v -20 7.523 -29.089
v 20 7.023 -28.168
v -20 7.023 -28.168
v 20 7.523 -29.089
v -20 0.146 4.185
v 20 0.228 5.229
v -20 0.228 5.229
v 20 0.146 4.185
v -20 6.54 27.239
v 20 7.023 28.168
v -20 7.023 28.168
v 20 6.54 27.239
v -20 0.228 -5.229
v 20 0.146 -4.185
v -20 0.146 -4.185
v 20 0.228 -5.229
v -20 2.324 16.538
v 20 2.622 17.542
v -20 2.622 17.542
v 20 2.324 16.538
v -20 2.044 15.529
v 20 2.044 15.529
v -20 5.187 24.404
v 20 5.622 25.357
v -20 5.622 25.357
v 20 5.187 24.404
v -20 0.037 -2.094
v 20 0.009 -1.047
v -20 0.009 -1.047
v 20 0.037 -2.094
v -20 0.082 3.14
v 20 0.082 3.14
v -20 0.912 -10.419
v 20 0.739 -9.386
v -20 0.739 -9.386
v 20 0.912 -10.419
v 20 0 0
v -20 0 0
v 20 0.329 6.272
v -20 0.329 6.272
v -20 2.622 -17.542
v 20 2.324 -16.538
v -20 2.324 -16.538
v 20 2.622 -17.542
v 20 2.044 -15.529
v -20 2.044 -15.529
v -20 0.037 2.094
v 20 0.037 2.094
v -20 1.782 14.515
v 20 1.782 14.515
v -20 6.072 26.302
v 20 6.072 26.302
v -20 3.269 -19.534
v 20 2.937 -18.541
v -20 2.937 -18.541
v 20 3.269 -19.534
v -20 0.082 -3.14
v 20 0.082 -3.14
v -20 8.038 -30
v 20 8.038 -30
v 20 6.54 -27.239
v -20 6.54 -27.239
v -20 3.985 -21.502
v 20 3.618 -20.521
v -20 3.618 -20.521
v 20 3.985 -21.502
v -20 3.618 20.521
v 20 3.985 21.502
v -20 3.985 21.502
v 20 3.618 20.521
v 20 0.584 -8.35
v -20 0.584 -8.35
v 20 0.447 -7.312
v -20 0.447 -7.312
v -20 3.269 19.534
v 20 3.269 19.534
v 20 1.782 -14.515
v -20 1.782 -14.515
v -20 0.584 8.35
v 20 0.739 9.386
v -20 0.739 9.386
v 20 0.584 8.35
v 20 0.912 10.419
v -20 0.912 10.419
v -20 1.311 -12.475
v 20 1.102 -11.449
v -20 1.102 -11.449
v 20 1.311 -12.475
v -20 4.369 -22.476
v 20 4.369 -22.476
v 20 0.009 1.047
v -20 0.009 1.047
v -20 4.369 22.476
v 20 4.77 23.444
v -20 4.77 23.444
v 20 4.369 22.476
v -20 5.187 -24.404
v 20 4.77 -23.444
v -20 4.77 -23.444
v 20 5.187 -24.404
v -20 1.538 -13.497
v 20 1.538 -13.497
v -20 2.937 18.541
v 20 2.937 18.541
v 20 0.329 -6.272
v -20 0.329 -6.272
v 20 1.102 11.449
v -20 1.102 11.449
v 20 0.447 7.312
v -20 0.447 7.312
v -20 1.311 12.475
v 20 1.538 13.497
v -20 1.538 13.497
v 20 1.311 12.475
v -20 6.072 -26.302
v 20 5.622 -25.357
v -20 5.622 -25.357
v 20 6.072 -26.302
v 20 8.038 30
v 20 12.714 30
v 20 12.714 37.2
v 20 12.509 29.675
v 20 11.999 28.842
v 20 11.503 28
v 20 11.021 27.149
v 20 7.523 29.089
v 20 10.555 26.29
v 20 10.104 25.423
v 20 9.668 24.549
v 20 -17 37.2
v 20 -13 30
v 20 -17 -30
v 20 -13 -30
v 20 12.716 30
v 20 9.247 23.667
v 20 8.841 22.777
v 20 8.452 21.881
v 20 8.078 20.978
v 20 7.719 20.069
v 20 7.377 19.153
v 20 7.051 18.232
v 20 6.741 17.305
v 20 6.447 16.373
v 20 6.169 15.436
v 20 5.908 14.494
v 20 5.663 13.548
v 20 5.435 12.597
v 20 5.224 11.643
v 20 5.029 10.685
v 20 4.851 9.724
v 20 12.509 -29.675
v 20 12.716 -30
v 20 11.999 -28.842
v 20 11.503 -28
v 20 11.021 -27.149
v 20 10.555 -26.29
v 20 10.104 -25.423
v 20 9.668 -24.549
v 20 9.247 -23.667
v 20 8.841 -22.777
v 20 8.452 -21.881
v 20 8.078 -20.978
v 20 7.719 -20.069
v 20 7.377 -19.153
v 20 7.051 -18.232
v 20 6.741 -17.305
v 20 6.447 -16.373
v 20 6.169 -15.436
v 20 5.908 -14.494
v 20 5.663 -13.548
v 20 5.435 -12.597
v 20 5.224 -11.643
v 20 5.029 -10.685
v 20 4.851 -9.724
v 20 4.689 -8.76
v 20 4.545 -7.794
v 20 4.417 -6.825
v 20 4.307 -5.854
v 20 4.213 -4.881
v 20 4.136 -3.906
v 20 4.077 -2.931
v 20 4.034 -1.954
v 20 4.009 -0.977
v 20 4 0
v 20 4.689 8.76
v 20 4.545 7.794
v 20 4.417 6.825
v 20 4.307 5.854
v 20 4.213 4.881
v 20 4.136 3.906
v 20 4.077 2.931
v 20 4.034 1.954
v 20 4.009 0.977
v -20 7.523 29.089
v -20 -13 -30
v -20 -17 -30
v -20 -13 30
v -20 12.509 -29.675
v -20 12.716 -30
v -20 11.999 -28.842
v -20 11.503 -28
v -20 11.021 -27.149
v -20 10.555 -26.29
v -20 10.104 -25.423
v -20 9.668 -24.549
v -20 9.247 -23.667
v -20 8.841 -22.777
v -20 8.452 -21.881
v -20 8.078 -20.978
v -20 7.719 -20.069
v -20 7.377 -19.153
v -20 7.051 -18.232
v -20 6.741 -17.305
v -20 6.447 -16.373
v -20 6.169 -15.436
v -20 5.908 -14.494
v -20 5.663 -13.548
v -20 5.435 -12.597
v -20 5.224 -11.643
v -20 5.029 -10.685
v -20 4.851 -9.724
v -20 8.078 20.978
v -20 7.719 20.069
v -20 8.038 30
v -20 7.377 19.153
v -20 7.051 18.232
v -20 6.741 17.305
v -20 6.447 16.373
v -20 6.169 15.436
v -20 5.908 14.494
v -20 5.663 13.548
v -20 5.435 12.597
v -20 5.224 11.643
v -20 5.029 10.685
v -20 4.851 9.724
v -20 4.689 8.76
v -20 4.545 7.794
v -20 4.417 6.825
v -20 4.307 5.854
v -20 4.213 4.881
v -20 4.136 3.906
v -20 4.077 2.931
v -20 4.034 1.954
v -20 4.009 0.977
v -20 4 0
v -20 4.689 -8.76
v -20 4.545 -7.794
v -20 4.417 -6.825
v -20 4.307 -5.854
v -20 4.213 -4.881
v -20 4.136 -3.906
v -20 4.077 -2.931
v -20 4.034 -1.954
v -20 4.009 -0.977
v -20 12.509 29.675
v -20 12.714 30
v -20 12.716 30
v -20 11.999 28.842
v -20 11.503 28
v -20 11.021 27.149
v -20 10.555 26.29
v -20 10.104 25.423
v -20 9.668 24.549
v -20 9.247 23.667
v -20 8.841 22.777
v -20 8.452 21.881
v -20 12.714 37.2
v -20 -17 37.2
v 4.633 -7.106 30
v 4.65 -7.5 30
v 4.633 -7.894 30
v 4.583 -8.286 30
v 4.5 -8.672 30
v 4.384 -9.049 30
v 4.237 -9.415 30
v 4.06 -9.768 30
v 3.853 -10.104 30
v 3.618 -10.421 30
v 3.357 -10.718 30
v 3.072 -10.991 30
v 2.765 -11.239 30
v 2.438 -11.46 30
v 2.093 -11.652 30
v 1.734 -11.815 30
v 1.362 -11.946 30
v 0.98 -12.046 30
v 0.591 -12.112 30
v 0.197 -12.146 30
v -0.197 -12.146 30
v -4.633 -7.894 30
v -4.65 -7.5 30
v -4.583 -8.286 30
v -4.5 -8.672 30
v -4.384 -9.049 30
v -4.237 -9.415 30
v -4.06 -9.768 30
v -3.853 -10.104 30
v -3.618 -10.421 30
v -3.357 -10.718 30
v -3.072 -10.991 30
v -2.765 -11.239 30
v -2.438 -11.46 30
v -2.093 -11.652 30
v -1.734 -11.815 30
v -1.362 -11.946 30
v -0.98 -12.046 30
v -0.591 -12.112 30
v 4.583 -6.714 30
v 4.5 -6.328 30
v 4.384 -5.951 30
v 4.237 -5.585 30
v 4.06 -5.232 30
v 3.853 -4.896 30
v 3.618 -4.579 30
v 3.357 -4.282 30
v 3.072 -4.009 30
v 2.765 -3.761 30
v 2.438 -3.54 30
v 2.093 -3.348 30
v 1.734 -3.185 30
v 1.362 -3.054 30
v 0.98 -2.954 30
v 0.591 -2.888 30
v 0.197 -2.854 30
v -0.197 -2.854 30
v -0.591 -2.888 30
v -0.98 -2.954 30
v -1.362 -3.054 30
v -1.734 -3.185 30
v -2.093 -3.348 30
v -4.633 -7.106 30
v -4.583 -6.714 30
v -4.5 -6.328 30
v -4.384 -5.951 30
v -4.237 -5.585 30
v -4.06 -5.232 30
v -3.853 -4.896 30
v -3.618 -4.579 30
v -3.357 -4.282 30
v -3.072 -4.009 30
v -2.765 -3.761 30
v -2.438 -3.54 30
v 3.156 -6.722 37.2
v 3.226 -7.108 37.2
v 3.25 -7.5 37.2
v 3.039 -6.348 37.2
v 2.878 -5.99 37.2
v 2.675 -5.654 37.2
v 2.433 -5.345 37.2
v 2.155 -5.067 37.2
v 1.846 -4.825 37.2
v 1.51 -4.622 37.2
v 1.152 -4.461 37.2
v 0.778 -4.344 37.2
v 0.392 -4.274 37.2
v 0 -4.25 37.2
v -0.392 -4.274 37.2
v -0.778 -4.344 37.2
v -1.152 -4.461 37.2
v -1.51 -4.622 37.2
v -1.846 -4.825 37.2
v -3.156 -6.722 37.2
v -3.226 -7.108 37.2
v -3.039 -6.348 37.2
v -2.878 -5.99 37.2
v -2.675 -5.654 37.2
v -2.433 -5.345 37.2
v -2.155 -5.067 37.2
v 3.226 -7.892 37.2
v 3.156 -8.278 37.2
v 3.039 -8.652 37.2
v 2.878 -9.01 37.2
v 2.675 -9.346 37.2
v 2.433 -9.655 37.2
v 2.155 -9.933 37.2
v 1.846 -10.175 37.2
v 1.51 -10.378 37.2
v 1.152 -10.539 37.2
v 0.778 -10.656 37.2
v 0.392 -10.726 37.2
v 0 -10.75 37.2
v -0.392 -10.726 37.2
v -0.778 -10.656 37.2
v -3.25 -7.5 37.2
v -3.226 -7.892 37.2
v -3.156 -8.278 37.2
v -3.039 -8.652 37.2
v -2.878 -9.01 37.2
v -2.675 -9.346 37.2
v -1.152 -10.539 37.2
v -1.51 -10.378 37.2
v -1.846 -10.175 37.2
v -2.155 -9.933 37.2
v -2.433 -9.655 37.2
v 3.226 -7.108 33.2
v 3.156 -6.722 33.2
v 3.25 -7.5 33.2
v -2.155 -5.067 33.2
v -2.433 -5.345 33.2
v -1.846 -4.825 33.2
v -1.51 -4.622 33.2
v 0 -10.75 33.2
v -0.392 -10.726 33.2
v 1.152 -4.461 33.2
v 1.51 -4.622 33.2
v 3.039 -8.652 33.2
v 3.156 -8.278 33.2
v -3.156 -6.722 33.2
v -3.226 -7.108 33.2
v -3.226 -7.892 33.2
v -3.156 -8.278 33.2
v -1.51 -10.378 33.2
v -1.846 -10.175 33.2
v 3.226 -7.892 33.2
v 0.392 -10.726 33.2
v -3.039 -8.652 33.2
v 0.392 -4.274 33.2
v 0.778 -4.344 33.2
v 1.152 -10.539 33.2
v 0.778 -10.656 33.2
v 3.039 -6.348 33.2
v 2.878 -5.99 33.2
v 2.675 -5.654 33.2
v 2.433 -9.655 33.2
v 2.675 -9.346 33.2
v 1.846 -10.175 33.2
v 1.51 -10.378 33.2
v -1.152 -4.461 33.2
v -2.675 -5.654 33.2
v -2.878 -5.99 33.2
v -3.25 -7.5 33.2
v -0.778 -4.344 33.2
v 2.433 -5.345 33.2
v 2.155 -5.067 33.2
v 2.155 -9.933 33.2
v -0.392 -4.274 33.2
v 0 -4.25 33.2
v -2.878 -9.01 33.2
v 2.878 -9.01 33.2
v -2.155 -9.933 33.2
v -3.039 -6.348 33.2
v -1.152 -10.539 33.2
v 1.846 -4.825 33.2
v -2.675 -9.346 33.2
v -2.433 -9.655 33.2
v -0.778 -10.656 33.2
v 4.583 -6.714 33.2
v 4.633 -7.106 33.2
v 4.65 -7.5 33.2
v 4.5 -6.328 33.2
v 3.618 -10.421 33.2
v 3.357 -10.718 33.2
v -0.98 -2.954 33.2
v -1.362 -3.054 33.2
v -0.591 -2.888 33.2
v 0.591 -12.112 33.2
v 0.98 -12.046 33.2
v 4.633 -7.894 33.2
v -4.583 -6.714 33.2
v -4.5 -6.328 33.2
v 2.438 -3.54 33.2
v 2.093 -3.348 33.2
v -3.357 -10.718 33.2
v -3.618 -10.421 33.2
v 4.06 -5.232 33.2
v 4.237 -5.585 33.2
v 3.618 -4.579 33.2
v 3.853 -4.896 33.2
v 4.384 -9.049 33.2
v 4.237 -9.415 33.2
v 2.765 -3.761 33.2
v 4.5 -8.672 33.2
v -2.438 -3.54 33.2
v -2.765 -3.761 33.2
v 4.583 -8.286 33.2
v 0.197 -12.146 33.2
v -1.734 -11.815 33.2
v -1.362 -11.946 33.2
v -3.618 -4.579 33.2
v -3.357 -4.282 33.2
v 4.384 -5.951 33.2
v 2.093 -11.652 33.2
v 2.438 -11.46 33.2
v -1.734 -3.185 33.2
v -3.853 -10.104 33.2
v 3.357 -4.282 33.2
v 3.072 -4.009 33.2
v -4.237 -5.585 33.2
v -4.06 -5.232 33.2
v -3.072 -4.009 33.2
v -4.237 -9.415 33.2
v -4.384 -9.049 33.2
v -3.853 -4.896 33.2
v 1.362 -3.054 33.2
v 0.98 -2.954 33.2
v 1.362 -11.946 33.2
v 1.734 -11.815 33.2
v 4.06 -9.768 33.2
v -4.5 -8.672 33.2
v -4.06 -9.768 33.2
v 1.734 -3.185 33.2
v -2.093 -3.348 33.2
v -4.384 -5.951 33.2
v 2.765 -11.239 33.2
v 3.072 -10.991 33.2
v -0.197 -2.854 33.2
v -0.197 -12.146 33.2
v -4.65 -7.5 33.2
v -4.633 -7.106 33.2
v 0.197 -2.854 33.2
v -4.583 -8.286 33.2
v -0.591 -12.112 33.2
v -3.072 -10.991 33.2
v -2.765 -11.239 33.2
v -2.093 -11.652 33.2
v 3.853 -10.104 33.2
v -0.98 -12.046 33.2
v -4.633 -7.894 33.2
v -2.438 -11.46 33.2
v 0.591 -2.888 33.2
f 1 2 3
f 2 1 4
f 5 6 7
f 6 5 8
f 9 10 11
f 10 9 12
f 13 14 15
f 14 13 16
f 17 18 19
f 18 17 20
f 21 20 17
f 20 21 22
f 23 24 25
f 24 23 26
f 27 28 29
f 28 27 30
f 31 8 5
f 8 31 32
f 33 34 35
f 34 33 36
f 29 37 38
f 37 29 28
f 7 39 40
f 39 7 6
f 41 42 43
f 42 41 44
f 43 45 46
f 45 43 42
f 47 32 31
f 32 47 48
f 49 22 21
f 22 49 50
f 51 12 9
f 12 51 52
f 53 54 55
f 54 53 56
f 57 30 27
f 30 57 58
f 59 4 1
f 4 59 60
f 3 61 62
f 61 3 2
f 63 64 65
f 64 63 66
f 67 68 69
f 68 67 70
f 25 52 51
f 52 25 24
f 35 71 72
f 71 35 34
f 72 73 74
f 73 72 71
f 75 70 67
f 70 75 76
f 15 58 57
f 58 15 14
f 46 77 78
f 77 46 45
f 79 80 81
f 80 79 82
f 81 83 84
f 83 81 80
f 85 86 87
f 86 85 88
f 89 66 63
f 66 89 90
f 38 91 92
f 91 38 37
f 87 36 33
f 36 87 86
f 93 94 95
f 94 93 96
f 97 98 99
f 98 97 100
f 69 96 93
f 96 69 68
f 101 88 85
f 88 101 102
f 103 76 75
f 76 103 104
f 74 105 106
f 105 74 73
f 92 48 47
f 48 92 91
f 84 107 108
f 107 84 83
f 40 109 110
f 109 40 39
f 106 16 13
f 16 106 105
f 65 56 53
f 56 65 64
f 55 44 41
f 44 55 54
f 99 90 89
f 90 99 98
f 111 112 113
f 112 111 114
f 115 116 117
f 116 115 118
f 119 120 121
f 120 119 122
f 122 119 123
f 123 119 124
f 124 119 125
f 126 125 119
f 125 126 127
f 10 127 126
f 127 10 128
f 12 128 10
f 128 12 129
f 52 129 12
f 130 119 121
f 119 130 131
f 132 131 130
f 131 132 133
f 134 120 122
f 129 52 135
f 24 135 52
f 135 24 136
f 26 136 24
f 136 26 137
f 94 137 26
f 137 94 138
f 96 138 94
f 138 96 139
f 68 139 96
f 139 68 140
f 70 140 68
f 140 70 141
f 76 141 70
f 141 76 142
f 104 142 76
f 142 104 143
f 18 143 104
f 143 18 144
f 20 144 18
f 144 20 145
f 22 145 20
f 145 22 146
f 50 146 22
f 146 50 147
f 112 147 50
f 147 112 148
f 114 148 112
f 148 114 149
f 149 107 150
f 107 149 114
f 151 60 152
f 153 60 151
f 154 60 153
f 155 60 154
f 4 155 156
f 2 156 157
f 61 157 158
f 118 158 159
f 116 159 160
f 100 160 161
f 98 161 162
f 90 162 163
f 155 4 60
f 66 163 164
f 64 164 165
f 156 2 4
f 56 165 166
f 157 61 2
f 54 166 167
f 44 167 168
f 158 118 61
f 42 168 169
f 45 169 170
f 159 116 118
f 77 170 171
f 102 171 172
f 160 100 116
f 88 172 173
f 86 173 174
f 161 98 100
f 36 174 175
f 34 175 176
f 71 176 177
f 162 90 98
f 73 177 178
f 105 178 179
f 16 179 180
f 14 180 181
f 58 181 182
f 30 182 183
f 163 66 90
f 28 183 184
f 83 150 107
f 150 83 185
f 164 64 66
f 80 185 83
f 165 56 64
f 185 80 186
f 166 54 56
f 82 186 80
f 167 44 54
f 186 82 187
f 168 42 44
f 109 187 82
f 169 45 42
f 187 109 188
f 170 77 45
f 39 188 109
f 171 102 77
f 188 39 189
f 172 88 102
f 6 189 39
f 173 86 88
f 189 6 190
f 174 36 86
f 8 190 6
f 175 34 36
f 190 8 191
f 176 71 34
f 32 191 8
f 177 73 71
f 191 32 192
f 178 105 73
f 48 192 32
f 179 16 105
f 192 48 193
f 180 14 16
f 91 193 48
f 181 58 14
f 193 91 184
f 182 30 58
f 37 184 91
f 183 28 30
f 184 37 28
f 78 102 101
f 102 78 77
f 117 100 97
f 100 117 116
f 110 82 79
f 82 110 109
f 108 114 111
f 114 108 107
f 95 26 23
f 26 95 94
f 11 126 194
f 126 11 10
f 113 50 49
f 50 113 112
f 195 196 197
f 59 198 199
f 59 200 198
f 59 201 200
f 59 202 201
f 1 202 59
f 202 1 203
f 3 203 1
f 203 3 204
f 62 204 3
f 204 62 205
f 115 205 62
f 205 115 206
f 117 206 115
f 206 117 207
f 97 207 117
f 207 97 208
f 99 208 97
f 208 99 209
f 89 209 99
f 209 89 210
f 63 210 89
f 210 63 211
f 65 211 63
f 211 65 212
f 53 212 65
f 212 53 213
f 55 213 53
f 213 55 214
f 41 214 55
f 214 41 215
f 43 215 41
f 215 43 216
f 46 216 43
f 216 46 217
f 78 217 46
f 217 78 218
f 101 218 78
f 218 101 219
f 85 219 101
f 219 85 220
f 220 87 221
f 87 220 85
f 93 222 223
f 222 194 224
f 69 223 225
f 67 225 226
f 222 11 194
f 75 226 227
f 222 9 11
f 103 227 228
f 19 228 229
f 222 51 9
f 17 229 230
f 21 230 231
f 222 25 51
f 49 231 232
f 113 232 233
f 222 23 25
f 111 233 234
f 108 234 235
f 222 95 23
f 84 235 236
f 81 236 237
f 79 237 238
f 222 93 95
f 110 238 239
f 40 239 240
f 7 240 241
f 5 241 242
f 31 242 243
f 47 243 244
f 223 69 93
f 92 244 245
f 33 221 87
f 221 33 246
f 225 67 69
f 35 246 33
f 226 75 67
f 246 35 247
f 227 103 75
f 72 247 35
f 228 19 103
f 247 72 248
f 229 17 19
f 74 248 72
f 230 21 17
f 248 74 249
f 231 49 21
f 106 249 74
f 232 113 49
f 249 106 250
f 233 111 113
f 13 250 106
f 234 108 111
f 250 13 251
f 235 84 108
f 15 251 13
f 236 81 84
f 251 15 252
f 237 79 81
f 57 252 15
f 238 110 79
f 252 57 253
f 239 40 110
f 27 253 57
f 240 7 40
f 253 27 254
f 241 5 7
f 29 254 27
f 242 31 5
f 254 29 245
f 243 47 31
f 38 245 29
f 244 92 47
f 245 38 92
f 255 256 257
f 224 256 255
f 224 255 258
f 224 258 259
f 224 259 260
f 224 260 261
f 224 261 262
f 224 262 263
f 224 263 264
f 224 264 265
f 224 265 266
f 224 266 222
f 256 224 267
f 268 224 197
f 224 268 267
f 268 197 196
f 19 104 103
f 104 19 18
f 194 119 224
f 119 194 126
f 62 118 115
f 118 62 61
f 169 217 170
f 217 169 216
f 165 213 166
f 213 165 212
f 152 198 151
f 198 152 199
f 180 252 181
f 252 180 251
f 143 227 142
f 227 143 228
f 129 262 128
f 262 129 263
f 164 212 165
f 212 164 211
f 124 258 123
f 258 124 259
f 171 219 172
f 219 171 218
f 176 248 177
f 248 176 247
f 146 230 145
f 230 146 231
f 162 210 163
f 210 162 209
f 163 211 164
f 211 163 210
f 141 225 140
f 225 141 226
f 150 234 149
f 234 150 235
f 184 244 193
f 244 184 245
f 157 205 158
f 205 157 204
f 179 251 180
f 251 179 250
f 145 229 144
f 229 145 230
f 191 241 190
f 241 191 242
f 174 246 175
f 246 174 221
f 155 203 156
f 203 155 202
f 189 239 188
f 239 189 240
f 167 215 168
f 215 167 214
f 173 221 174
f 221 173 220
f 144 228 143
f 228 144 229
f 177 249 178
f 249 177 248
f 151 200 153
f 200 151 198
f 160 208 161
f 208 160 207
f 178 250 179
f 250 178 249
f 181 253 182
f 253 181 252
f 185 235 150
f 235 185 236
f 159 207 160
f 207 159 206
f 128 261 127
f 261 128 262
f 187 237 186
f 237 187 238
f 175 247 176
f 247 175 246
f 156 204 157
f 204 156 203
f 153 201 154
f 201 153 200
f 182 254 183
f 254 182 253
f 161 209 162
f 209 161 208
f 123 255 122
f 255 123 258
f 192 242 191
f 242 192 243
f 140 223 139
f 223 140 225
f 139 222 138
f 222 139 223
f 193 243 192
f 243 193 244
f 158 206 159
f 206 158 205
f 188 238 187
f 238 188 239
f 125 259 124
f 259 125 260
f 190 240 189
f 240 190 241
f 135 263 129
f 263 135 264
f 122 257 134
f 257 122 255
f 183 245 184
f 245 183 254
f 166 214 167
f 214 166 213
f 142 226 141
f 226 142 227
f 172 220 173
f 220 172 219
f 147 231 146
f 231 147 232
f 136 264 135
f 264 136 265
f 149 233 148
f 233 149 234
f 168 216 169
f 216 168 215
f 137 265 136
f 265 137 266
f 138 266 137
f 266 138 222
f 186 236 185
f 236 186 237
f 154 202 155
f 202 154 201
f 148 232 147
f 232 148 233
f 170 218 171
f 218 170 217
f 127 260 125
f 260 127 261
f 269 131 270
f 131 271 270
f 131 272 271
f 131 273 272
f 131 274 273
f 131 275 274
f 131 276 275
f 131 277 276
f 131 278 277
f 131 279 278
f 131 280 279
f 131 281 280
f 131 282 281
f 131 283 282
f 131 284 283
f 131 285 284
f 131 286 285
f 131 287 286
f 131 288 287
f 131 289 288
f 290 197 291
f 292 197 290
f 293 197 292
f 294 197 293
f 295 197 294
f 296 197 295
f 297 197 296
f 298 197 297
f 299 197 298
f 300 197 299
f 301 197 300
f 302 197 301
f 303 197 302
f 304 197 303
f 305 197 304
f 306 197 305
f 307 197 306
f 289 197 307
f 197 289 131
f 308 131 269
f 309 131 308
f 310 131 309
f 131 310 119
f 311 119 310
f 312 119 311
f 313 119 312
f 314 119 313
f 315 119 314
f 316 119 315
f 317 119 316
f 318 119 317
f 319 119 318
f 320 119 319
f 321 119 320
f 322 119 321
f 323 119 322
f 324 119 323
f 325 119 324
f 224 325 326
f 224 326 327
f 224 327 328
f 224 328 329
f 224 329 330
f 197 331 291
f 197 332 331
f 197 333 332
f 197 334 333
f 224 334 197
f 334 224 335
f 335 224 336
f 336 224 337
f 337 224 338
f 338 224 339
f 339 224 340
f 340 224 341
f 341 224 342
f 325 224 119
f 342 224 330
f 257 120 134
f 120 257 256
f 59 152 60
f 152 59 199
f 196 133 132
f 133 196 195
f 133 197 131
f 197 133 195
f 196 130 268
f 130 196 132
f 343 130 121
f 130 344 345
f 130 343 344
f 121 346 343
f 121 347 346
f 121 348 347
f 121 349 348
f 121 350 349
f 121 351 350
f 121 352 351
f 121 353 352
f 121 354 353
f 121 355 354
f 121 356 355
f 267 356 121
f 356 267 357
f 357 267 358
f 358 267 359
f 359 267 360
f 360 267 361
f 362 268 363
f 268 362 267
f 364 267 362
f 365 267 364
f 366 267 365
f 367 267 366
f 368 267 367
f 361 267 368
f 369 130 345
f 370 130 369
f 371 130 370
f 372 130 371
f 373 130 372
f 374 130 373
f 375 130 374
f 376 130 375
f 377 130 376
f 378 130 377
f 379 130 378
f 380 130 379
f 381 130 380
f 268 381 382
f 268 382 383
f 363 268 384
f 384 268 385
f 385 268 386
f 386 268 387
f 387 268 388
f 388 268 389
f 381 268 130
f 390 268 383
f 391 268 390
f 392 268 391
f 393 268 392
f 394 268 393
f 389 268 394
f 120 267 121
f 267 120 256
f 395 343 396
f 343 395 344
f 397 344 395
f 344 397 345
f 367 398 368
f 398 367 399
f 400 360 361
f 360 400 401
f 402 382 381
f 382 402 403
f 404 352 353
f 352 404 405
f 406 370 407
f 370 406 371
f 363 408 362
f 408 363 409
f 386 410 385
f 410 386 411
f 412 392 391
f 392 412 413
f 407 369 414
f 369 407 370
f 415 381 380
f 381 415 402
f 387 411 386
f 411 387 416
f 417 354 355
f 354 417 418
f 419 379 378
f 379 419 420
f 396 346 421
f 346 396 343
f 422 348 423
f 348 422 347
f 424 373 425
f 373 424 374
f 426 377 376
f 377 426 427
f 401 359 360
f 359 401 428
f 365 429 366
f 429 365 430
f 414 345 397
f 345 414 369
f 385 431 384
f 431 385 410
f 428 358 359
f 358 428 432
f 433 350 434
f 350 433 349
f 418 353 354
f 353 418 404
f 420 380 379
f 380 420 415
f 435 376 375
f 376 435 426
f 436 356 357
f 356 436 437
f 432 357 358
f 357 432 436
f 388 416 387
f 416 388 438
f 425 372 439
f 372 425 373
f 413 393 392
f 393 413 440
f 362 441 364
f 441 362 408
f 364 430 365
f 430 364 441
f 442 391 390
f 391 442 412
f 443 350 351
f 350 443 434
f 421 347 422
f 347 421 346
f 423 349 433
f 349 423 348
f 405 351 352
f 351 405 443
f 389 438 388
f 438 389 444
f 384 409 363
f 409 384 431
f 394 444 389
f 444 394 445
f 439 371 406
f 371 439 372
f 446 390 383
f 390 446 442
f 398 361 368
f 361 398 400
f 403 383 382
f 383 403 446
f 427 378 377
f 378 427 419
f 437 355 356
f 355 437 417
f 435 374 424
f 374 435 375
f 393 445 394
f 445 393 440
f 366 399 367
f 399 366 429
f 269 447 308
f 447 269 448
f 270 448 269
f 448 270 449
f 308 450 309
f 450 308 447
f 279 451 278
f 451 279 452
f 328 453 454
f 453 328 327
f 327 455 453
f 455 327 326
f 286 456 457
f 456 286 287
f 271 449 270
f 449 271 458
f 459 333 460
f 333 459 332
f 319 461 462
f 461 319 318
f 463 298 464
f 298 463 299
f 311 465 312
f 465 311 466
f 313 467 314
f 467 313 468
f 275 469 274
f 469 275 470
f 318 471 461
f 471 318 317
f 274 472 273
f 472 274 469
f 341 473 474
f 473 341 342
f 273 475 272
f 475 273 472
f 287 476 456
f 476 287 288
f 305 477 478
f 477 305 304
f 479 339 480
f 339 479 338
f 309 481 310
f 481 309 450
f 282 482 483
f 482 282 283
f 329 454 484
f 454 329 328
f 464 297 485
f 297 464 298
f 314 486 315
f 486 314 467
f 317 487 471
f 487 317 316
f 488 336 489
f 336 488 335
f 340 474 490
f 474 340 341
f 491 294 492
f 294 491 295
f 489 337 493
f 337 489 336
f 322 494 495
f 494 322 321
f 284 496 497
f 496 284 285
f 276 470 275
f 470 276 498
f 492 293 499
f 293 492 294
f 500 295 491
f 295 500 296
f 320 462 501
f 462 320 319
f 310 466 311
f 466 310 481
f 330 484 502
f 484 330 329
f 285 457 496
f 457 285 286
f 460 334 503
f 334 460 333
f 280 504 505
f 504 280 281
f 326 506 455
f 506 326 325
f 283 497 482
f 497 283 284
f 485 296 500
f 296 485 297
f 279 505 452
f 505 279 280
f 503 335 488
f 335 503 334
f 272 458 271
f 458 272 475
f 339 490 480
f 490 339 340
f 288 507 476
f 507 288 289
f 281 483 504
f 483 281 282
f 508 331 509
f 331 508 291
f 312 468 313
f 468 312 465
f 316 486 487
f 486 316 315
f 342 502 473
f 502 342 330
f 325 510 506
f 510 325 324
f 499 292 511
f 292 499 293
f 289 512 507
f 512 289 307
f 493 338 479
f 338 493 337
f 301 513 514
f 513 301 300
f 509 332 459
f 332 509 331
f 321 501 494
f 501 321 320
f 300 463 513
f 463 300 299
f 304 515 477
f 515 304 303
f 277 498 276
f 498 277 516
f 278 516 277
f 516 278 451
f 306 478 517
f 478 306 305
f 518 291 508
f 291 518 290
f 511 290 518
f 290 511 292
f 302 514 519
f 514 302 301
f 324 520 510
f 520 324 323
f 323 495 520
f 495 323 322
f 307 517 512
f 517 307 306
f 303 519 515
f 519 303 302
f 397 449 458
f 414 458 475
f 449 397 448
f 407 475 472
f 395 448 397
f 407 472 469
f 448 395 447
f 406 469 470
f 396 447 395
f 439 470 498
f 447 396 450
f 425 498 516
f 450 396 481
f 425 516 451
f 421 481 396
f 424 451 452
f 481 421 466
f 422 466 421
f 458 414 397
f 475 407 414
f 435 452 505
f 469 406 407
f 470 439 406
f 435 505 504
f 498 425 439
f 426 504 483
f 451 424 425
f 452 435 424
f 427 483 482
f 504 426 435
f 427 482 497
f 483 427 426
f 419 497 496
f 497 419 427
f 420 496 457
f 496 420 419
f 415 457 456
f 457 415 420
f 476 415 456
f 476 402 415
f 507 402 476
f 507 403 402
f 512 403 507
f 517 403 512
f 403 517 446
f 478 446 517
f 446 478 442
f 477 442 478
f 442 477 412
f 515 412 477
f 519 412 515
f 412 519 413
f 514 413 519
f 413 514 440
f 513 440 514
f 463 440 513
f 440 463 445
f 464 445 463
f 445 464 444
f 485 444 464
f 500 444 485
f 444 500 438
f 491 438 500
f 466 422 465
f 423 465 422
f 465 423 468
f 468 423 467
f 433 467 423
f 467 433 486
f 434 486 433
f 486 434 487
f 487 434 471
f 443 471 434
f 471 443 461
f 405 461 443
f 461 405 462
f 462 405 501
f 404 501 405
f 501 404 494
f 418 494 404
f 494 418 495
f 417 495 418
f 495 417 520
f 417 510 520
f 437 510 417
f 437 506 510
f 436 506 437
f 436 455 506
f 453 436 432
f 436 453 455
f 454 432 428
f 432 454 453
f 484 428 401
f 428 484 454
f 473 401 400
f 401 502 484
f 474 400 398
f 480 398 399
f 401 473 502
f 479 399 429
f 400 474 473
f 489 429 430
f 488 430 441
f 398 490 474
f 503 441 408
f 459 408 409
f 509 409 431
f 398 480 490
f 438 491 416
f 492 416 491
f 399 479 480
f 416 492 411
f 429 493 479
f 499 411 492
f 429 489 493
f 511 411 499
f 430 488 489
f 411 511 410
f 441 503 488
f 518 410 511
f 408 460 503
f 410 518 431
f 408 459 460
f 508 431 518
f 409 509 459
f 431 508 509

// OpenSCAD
$fa = 1;
$fs = 0.4;

fastening_width = 40.00;
fastening_height = 60.00;
bed_thickness = 15.00;
fastening_thickness = 4.00;
/* Arch for the fastening */
reflex_r = fastening_height;

screw_diameter = 6.50;
screw_head_diameter = 9.30;
screw_head_thickness = 3.20;

difference () {
    /* Base */
    union () {
        translate([0, reflex_r, 0]) difference() {
            rotate([90, 0, 90]) difference()
            {
                /* Base */
                cylinder(h=fastening_width, r=reflex_r, center=true);
                cylinder(h=fastening_width*2, r=reflex_r-fastening_thickness, center=true);
            }

            /* Height Cut */
            translate([0, 0, fastening_height/2.00+fastening_height/2.00])
                cube([fastening_height*10, fastening_width*10, fastening_height], center=true);
            translate([0, 0, -fastening_height/2.00-fastening_height/2.00])
                cube([fastening_height*10, fastening_width*10, fastening_height], center=true);

            /* Width Cut */
            translate([0, bed_thickness*5, 0])
                cube([fastening_width*2, bed_thickness*10, fastening_height*2], center=true);
        }

        /* Wall */
        translate([0, -bed_thickness])
            cube([fastening_width, fastening_thickness, fastening_height], center=true);

        /* Roof */
        __x = sqrt(((reflex_r-fastening_thickness)*(reflex_r-fastening_thickness)) - ((fastening_height/2)*(fastening_height/2)));
        translate([-fastening_width/2, -bed_thickness-fastening_thickness/2, fastening_height/2])
            cube([fastening_width, bed_thickness+(reflex_r-__x)+fastening_thickness/2, fastening_thickness+screw_head_thickness]);
    }
    screw_center = -bed_thickness/2;
    translate([0, screw_center, fastening_height/2.00 - 0.5])
        cylinder (h=1.00 + fastening_thickness+screw_head_thickness, r=screw_diameter/2);

    translate([0, screw_center, fastening_height/2.00-1.00])
        cylinder (h=1.00 + screw_head_thickness, r=screw_head_diameter/2);
}
